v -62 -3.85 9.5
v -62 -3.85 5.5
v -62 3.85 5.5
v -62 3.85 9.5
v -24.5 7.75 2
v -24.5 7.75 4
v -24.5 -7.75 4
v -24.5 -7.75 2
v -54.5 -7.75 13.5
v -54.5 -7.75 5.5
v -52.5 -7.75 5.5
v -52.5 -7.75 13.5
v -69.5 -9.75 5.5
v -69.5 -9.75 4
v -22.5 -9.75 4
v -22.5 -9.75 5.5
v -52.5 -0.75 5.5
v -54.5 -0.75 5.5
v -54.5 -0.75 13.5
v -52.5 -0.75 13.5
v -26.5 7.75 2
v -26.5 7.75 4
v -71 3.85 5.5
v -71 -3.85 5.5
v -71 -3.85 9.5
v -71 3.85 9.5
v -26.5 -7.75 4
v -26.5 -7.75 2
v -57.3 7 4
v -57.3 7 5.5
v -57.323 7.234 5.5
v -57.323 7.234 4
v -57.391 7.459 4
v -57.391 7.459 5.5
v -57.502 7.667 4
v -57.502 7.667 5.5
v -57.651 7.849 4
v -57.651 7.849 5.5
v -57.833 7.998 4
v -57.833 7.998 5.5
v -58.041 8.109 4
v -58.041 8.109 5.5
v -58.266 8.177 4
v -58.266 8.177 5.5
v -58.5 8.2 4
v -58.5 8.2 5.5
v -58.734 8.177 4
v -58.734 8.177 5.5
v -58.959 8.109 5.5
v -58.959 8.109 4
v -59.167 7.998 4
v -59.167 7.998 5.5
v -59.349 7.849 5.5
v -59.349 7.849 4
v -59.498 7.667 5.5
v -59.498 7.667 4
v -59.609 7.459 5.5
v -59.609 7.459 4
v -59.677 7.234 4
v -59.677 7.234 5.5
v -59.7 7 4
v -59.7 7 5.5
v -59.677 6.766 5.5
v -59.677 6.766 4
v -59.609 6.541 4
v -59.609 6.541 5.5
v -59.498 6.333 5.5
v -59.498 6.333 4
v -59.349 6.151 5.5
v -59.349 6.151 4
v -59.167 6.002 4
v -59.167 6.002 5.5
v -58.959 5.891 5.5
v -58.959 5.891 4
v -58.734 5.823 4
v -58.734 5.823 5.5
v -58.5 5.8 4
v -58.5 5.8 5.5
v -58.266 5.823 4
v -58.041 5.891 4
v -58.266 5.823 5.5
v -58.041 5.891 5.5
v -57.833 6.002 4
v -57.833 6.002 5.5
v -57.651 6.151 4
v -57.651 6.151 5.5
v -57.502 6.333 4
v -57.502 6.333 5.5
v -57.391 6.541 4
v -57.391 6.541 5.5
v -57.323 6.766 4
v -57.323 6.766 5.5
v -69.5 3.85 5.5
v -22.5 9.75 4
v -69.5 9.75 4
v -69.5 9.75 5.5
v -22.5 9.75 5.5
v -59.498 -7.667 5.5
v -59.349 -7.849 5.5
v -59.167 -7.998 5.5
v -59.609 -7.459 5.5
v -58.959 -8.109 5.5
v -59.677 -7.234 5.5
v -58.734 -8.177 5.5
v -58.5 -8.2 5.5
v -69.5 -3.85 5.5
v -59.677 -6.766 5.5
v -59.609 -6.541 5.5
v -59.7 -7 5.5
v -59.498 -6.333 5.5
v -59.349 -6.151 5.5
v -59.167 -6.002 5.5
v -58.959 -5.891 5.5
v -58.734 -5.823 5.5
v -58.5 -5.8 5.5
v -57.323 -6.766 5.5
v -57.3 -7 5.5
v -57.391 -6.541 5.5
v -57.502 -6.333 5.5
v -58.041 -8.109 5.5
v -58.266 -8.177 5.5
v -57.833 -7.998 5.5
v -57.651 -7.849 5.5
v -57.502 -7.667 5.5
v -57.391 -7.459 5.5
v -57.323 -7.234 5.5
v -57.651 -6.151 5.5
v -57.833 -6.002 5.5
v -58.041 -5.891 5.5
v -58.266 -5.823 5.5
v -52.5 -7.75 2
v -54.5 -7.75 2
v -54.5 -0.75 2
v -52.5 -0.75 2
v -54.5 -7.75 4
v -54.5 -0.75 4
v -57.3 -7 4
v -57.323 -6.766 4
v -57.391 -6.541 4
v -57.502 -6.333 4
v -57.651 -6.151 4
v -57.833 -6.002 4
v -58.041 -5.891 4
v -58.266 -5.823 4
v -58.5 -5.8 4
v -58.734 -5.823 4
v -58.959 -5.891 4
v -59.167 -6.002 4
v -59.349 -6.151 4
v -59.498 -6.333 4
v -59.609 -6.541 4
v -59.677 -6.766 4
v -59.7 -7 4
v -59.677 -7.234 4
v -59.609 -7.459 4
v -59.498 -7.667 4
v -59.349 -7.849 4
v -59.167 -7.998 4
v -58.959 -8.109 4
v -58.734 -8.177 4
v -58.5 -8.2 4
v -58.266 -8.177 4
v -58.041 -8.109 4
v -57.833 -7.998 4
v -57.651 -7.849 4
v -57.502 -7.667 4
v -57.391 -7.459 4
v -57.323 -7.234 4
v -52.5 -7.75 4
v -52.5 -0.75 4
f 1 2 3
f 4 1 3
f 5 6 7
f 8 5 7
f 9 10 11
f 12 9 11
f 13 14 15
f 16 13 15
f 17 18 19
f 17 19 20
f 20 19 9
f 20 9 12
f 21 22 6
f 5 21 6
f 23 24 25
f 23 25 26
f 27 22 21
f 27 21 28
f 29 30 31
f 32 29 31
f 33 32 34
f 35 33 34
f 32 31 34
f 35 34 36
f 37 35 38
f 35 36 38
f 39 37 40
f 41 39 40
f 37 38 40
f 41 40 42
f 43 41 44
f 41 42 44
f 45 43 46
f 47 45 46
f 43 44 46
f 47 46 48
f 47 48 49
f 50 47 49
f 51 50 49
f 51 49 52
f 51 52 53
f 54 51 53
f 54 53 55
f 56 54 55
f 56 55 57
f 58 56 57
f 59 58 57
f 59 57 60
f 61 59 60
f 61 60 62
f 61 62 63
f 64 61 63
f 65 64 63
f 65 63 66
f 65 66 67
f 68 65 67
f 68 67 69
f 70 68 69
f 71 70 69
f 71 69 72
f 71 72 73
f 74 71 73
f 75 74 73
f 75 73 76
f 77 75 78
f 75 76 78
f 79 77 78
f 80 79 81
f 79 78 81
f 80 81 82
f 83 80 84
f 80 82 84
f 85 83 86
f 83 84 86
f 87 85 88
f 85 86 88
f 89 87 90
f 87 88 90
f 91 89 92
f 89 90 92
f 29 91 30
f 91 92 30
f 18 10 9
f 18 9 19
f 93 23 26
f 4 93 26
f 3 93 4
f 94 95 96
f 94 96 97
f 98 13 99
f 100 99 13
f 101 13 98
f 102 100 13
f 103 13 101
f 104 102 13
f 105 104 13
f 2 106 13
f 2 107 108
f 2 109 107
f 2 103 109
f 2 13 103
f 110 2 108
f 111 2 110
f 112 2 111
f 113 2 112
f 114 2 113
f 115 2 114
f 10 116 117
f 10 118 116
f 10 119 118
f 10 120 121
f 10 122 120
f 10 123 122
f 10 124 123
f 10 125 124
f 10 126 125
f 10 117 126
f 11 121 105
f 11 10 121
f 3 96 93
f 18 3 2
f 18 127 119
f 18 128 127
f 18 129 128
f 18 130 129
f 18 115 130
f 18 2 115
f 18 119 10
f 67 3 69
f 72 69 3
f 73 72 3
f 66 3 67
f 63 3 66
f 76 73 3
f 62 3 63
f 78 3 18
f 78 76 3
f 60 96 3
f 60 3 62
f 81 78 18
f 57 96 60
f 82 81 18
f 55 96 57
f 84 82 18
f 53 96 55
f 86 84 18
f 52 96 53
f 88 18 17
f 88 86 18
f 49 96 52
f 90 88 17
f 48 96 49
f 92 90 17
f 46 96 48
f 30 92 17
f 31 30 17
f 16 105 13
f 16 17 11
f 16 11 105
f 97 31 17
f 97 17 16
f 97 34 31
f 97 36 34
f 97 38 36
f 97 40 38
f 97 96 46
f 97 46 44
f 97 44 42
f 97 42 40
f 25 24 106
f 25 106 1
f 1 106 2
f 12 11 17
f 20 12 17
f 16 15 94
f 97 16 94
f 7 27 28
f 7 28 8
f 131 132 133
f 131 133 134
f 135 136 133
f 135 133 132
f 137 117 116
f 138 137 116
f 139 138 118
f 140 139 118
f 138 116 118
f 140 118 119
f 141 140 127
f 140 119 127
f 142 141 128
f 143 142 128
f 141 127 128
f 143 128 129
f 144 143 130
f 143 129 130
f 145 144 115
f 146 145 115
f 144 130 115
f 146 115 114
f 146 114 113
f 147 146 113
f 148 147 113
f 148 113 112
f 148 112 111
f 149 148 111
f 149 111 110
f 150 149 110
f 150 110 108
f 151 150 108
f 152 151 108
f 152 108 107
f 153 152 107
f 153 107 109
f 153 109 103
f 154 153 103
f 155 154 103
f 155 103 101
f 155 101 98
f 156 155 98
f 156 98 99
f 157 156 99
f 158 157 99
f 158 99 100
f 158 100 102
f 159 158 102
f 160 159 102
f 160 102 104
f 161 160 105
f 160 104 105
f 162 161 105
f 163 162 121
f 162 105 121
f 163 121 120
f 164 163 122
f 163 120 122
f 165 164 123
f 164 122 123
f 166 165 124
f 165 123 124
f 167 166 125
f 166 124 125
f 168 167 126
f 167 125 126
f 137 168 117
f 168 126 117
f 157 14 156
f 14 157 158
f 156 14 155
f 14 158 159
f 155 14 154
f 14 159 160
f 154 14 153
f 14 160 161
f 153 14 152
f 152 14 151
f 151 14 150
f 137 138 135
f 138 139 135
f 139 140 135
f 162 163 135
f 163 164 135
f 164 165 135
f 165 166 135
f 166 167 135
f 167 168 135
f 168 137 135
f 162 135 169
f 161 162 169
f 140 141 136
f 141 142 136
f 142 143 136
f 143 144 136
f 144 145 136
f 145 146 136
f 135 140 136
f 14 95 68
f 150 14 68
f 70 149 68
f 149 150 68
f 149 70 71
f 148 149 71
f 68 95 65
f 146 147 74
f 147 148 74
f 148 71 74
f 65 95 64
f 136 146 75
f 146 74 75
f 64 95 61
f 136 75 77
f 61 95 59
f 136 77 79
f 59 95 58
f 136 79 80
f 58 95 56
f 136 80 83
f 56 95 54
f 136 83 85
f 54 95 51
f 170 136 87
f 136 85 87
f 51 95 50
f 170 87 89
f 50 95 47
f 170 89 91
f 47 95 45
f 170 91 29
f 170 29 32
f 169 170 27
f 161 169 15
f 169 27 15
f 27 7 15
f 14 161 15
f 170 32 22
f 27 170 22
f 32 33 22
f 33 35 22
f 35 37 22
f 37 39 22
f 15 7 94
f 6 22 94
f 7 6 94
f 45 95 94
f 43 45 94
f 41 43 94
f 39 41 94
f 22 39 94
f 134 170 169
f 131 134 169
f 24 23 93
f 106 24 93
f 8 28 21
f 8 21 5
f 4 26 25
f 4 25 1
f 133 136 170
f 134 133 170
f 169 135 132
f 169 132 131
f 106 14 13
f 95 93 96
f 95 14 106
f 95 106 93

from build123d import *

# Parameters (mm, degrees)
SKETCH010_W     = 47
SKETCH010_H     = 19.5
PAD006_DEPTH    = 1.5
SKETCH011_W     = 9
SKETCH011_H     = 7.7
PAD008_DEPTH    = 4
SKETCH012_R     = 1.2
POCKET003_DEPTH = 1.501
SKETCH013_W     = 2
SKETCH013_H     = 15.5
SKETCH013_H_2   = 7
PAD007_DEPTH    = 2
SKETCH004_W     = 2
SKETCH004_H     = 7
PAD005_DEPTH    = 8


with BuildPart() as part:
    # Sketch010 → Pad006 (new body)
    with BuildSketch(Plane.XY):
        with Locations((23.5, 9.75)):
            Rectangle(SKETCH010_W, SKETCH010_H)
    extrude(amount=PAD006_DEPTH)

    # Sketch011 (on Face6 of Pad006) → Pad008 (join)
    with BuildSketch(Plane.XY.offset(1.5)):
        with Locations((3, 9.75)):
            Rectangle(SKETCH011_W, SKETCH011_H)
    extrude(amount=PAD008_DEPTH)

    # Sketch012 (on Face5 of Pad008) → Pocket003 (cut, through all)
    with BuildSketch(Plane.XY.offset(1.5)):
        with Locations((11, 16.75)):
            Circle(SKETCH012_R)
        with Locations((11, 2.75)):
            Circle(SKETCH012_R)
    extrude(amount=-POCKET003_DEPTH, mode=Mode.SUBTRACT)

    # Sketch013 (on Face4 of Pocket003) → Pad007 (join)
    with BuildSketch(Plane(origin=(0, 0, 0), x_dir=(1, 0, 0), z_dir=(0, 0, -1))):
        with Locations((44, -9.75)):
            Rectangle(SKETCH013_W, SKETCH013_H)
        with Locations((16, -5.5)):
            Rectangle(SKETCH013_W, SKETCH013_H_2)
    extrude(amount=PAD007_DEPTH)

    # Sketch004 (on Face5 of Pad007) → Pad005 (join)
    with BuildSketch(Plane.XY.offset(1.5)):
        with Locations((16, 5.5)):
            Rectangle(SKETCH004_W, SKETCH004_H)
    extrude(amount=PAD005_DEPTH)


with BuildPart() as part_1:
    # Body001 placement: moved
    add(part.part.moved(Location((-69.5, -9.75, 4))))


solid = part_1.part
